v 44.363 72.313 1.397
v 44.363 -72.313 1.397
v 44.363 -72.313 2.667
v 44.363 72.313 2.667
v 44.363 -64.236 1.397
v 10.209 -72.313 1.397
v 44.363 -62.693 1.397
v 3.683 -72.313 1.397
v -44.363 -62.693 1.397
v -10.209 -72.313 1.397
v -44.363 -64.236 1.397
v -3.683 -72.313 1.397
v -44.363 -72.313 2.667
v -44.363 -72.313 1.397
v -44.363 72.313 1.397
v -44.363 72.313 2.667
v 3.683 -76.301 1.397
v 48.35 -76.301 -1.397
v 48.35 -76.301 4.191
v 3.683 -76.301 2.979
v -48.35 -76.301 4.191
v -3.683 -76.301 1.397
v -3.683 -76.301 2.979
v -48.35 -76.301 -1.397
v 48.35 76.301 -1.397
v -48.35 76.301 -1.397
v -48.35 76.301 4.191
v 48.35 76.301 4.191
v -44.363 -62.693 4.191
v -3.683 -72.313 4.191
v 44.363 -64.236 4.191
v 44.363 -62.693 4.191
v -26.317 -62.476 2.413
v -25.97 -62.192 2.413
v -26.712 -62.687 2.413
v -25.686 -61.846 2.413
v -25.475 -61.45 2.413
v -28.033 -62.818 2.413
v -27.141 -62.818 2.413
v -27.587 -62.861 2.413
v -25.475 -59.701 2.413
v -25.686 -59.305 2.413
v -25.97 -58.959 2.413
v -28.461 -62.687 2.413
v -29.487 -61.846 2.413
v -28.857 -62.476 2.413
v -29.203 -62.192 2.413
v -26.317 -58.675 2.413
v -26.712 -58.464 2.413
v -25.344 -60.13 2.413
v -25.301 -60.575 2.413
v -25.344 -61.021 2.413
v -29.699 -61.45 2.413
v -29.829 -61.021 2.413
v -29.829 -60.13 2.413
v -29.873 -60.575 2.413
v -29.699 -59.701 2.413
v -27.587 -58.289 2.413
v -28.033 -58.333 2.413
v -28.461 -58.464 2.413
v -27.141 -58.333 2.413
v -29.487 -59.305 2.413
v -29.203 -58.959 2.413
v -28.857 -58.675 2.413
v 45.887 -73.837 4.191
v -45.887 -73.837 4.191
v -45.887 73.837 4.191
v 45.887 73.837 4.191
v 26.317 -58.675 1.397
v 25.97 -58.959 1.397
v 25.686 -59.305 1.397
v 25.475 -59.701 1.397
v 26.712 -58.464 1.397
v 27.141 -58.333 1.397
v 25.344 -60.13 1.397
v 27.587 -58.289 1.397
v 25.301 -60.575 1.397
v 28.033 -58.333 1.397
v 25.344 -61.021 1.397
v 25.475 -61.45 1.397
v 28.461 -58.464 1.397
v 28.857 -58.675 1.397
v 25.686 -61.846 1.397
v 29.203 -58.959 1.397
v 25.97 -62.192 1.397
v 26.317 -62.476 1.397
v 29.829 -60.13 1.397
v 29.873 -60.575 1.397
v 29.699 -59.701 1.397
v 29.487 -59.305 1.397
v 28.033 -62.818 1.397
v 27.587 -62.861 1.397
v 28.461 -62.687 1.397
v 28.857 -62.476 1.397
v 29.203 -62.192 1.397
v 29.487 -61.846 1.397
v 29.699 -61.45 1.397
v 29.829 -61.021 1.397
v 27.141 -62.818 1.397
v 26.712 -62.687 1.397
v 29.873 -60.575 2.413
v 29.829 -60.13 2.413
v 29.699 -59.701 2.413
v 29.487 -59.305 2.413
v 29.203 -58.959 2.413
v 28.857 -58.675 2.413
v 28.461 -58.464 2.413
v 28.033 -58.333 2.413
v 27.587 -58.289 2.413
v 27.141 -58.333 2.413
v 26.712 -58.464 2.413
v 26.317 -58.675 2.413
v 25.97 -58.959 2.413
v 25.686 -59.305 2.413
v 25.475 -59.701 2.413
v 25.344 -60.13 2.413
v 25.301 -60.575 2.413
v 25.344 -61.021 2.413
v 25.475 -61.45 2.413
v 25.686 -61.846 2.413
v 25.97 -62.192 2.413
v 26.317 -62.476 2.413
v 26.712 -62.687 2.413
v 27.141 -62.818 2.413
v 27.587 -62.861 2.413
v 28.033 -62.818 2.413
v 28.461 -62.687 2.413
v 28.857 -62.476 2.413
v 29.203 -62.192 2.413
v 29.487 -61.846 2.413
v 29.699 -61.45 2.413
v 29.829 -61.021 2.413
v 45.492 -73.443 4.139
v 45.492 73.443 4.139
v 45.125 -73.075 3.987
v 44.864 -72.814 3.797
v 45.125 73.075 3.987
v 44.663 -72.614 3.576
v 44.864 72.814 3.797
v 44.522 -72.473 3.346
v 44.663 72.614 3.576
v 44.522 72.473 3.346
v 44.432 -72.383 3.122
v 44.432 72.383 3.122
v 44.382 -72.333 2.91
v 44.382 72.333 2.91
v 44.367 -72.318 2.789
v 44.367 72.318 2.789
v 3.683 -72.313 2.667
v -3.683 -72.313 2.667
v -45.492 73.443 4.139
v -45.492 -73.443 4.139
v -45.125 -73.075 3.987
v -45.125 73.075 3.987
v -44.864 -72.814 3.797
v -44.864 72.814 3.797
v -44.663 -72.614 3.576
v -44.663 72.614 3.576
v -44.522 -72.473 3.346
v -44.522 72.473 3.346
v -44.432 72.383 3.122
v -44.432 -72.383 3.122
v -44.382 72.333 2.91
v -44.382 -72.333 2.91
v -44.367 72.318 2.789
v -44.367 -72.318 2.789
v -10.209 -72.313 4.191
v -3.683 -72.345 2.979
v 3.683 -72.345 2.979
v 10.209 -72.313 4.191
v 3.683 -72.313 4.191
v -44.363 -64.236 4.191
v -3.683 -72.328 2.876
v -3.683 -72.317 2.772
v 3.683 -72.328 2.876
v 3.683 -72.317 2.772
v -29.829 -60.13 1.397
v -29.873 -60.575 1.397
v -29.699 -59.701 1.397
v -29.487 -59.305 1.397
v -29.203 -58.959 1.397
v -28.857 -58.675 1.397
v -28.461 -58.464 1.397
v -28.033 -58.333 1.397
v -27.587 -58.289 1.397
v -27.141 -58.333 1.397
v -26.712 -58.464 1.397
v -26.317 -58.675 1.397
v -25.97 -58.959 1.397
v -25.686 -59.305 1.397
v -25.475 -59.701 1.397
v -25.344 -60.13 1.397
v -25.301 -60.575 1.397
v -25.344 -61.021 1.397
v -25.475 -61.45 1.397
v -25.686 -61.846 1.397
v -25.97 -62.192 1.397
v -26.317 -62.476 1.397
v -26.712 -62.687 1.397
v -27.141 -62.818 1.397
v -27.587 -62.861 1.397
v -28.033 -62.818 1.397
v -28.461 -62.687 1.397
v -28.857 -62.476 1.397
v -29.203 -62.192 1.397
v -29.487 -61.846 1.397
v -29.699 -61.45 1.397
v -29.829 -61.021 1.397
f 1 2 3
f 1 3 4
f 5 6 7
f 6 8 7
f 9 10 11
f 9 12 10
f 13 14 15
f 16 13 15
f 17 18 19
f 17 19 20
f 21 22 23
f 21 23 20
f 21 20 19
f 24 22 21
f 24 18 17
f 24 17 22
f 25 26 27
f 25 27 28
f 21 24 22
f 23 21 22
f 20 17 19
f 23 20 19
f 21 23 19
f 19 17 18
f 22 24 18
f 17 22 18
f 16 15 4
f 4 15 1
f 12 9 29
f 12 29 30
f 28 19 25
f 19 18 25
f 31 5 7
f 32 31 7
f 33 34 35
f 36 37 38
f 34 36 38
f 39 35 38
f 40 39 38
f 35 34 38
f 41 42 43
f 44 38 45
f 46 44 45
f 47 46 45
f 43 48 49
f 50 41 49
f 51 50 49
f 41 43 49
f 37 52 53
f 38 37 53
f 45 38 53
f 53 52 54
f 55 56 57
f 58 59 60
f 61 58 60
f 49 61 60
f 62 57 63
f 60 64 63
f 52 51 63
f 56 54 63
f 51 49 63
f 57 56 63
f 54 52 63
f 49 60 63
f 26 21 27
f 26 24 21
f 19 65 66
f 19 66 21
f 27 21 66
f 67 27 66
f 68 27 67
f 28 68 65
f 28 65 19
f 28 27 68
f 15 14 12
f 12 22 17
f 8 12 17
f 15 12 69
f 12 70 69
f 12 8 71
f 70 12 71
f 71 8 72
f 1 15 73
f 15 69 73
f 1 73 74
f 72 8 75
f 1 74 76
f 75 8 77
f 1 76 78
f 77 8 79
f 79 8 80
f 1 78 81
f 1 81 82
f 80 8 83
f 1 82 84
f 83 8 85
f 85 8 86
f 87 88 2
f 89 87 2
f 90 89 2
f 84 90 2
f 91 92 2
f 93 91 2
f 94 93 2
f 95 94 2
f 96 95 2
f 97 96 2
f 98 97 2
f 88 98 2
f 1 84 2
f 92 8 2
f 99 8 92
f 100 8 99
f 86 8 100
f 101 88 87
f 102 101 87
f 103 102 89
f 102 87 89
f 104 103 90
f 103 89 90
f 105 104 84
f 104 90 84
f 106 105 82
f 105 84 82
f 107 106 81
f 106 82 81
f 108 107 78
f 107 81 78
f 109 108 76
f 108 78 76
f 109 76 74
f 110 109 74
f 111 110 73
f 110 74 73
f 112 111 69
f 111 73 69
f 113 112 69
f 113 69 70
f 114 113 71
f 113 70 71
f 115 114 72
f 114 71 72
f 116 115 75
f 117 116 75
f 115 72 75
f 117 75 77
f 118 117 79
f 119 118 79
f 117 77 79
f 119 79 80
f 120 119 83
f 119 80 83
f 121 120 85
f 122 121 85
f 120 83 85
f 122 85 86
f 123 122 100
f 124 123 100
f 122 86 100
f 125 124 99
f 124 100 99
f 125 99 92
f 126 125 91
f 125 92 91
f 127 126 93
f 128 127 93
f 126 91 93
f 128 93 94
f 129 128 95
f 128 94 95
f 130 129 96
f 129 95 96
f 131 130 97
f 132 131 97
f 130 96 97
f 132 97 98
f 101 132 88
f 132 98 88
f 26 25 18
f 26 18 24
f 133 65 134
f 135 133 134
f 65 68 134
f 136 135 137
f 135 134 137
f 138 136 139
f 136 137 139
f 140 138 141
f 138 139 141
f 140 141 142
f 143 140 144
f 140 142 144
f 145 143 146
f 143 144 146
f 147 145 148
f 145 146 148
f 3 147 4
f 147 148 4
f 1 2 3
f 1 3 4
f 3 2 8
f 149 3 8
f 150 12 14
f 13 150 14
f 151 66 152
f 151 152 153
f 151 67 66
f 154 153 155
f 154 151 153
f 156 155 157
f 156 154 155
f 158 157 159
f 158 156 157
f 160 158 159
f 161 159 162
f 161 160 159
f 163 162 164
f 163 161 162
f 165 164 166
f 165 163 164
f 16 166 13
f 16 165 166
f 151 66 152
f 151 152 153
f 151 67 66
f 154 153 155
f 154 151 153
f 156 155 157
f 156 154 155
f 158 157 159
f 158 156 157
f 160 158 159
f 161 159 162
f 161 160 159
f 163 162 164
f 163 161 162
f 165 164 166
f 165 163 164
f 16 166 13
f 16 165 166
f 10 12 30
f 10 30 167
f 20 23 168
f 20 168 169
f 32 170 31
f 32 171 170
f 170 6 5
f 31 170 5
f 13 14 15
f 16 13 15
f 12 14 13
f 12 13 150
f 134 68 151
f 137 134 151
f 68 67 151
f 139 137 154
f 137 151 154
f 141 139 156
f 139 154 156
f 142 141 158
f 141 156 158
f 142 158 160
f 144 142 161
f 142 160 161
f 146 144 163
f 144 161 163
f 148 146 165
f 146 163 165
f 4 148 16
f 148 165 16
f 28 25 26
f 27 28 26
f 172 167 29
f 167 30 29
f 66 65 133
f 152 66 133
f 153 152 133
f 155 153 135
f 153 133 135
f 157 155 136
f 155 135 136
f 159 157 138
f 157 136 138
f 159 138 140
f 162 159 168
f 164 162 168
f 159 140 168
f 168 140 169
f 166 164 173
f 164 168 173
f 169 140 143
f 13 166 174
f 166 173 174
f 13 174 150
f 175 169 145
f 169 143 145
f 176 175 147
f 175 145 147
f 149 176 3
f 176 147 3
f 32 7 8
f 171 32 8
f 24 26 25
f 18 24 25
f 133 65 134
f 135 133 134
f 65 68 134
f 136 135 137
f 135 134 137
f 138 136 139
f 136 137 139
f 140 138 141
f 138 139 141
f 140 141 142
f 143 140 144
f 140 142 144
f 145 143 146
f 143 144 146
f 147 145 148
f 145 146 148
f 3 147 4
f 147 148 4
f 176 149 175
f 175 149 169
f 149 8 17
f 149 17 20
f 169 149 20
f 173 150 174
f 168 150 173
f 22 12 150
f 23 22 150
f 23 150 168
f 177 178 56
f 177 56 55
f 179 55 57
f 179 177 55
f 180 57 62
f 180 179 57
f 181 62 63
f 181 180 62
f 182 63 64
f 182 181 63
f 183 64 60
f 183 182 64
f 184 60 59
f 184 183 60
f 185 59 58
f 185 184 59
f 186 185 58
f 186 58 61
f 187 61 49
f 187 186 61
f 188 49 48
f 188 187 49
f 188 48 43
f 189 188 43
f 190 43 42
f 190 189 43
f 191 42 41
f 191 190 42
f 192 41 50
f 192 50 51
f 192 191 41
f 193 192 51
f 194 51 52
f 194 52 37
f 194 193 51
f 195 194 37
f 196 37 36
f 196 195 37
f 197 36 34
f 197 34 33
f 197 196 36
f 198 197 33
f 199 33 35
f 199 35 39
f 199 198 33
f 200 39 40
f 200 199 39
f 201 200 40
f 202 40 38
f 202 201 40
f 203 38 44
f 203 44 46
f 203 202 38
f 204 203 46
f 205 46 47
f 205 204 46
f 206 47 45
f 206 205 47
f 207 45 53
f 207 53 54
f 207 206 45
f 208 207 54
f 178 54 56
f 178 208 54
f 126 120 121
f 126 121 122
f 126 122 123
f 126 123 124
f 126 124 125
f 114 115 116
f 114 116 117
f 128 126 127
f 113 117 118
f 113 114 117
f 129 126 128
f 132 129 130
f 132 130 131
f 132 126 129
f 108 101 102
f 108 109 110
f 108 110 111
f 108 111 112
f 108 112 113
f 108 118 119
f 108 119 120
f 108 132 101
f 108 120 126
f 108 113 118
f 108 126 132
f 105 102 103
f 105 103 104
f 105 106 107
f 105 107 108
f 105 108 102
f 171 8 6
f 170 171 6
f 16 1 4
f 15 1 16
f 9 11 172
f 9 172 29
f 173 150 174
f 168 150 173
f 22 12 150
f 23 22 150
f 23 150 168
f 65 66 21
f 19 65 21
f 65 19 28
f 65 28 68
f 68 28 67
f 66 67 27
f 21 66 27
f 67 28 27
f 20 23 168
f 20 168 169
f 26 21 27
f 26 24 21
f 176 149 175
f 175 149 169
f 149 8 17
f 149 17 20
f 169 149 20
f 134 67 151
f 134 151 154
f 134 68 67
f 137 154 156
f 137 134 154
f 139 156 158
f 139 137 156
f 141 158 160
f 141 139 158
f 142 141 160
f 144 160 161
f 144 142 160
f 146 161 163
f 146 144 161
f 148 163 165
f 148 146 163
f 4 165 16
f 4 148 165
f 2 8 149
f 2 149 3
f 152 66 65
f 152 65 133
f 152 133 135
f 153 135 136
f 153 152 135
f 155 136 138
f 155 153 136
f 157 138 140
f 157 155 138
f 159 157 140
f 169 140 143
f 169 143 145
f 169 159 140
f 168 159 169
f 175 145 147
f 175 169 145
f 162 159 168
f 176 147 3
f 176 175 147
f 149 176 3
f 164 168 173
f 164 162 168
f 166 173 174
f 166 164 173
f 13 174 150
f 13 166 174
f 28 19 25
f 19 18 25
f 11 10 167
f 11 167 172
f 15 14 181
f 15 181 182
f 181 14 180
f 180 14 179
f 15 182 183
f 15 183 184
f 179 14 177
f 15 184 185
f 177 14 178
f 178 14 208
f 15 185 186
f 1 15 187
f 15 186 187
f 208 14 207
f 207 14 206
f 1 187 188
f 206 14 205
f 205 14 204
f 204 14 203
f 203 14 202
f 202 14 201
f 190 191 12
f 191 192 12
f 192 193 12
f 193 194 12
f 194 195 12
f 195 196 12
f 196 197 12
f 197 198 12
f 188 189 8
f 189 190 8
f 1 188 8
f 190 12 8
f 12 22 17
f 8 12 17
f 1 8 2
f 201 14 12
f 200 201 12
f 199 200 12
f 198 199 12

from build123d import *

# Parameters (mm, degrees)
F0_W      = 96.700832
F0_H      = 152.601854
F1_DEPTH  = 1.397
F2_W      = 96.700832
F2_H      = 152.601854
F2_W_2    = 88.725232
F2_H_2    = 144.626254
F3_DEPTH  = 2.794
F4_R      = 1.524
F5_R      = 2.286
F6_DEPTH  = 1.016
F8_W      = 7.366
F8_H      = 1.582388
F9_DEPTH  = 25.4
F11_DEPTH = 2.794


with BuildPart() as f1:
    # F0 (on Top) → F1 (new body, symmetric)
    with BuildSketch(Plane.XY):
        Rectangle(F0_W, F0_H)
    extrude(amount=F1_DEPTH, both=True)

    # F2 (on face) → F3 (join)
    with BuildSketch(Plane.XY.offset(1.397)):
        Rectangle(F2_W, F2_H)
        Rectangle(F2_W_2, F2_H_2, mode=Mode.SUBTRACT)
    extrude(amount=F3_DEPTH)

    # F4
    f4_edges = [f1.edges().sort_by_distance(p)[0] for p in [
        (-44.362616, 0, 4.191),
        (0, 72.313127, 4.191),
        (44.362616, 0, 4.191),
        (0, -72.313127, 4.191),
    ]]
    fillet(f4_edges, radius=F4_R)

    # F5 (on face) → F6 (join)
    with BuildSketch(Plane.XY.offset(1.397)):
        with Locations((27.586563, -60.575493)):
            Circle(F5_R)
    extrude(amount=F6_DEPTH)


with BuildPart() as f7_1:
    # F7: instance of F1
    add(f1.part.mirror(Plane.YZ))


with BuildPart() as f9_tool:
    # F8 (on face) → F9 (new body)
    with BuildSketch(Plane.XZ.offset(76.300927)):
        with Locations((0, 2.188194)):
            Rectangle(F8_W, F8_H)
    extrude(amount=-F9_DEPTH)


with BuildPart() as f1_1:
    add(f1.part)

    # F9: cut by f9_tool
    add(f9_tool.part, mode=Mode.SUBTRACT)


with BuildPart() as f7_1_1:
    add(f7_1.part)

    # F9: cut by f9_tool
    add(f9_tool.part, mode=Mode.SUBTRACT)


with BuildPart() as f11:
    # F10 (on face) → F11 (new body)
    with BuildSketch(Plane.XY.offset(1.397)):
        Polygon((44.362616, -62.693246), (3.683, -72.313127), (10.208725, -72.313127), (44.362616, -64.236443), align=None)
    extrude(amount=F11_DEPTH)


with BuildPart() as f12_1:
    # F12: instance of F11
    add(f11.part.mirror(Plane.YZ))


solid = Compound([f1_1.part, f7_1_1.part, f11.part, f12_1.part])
